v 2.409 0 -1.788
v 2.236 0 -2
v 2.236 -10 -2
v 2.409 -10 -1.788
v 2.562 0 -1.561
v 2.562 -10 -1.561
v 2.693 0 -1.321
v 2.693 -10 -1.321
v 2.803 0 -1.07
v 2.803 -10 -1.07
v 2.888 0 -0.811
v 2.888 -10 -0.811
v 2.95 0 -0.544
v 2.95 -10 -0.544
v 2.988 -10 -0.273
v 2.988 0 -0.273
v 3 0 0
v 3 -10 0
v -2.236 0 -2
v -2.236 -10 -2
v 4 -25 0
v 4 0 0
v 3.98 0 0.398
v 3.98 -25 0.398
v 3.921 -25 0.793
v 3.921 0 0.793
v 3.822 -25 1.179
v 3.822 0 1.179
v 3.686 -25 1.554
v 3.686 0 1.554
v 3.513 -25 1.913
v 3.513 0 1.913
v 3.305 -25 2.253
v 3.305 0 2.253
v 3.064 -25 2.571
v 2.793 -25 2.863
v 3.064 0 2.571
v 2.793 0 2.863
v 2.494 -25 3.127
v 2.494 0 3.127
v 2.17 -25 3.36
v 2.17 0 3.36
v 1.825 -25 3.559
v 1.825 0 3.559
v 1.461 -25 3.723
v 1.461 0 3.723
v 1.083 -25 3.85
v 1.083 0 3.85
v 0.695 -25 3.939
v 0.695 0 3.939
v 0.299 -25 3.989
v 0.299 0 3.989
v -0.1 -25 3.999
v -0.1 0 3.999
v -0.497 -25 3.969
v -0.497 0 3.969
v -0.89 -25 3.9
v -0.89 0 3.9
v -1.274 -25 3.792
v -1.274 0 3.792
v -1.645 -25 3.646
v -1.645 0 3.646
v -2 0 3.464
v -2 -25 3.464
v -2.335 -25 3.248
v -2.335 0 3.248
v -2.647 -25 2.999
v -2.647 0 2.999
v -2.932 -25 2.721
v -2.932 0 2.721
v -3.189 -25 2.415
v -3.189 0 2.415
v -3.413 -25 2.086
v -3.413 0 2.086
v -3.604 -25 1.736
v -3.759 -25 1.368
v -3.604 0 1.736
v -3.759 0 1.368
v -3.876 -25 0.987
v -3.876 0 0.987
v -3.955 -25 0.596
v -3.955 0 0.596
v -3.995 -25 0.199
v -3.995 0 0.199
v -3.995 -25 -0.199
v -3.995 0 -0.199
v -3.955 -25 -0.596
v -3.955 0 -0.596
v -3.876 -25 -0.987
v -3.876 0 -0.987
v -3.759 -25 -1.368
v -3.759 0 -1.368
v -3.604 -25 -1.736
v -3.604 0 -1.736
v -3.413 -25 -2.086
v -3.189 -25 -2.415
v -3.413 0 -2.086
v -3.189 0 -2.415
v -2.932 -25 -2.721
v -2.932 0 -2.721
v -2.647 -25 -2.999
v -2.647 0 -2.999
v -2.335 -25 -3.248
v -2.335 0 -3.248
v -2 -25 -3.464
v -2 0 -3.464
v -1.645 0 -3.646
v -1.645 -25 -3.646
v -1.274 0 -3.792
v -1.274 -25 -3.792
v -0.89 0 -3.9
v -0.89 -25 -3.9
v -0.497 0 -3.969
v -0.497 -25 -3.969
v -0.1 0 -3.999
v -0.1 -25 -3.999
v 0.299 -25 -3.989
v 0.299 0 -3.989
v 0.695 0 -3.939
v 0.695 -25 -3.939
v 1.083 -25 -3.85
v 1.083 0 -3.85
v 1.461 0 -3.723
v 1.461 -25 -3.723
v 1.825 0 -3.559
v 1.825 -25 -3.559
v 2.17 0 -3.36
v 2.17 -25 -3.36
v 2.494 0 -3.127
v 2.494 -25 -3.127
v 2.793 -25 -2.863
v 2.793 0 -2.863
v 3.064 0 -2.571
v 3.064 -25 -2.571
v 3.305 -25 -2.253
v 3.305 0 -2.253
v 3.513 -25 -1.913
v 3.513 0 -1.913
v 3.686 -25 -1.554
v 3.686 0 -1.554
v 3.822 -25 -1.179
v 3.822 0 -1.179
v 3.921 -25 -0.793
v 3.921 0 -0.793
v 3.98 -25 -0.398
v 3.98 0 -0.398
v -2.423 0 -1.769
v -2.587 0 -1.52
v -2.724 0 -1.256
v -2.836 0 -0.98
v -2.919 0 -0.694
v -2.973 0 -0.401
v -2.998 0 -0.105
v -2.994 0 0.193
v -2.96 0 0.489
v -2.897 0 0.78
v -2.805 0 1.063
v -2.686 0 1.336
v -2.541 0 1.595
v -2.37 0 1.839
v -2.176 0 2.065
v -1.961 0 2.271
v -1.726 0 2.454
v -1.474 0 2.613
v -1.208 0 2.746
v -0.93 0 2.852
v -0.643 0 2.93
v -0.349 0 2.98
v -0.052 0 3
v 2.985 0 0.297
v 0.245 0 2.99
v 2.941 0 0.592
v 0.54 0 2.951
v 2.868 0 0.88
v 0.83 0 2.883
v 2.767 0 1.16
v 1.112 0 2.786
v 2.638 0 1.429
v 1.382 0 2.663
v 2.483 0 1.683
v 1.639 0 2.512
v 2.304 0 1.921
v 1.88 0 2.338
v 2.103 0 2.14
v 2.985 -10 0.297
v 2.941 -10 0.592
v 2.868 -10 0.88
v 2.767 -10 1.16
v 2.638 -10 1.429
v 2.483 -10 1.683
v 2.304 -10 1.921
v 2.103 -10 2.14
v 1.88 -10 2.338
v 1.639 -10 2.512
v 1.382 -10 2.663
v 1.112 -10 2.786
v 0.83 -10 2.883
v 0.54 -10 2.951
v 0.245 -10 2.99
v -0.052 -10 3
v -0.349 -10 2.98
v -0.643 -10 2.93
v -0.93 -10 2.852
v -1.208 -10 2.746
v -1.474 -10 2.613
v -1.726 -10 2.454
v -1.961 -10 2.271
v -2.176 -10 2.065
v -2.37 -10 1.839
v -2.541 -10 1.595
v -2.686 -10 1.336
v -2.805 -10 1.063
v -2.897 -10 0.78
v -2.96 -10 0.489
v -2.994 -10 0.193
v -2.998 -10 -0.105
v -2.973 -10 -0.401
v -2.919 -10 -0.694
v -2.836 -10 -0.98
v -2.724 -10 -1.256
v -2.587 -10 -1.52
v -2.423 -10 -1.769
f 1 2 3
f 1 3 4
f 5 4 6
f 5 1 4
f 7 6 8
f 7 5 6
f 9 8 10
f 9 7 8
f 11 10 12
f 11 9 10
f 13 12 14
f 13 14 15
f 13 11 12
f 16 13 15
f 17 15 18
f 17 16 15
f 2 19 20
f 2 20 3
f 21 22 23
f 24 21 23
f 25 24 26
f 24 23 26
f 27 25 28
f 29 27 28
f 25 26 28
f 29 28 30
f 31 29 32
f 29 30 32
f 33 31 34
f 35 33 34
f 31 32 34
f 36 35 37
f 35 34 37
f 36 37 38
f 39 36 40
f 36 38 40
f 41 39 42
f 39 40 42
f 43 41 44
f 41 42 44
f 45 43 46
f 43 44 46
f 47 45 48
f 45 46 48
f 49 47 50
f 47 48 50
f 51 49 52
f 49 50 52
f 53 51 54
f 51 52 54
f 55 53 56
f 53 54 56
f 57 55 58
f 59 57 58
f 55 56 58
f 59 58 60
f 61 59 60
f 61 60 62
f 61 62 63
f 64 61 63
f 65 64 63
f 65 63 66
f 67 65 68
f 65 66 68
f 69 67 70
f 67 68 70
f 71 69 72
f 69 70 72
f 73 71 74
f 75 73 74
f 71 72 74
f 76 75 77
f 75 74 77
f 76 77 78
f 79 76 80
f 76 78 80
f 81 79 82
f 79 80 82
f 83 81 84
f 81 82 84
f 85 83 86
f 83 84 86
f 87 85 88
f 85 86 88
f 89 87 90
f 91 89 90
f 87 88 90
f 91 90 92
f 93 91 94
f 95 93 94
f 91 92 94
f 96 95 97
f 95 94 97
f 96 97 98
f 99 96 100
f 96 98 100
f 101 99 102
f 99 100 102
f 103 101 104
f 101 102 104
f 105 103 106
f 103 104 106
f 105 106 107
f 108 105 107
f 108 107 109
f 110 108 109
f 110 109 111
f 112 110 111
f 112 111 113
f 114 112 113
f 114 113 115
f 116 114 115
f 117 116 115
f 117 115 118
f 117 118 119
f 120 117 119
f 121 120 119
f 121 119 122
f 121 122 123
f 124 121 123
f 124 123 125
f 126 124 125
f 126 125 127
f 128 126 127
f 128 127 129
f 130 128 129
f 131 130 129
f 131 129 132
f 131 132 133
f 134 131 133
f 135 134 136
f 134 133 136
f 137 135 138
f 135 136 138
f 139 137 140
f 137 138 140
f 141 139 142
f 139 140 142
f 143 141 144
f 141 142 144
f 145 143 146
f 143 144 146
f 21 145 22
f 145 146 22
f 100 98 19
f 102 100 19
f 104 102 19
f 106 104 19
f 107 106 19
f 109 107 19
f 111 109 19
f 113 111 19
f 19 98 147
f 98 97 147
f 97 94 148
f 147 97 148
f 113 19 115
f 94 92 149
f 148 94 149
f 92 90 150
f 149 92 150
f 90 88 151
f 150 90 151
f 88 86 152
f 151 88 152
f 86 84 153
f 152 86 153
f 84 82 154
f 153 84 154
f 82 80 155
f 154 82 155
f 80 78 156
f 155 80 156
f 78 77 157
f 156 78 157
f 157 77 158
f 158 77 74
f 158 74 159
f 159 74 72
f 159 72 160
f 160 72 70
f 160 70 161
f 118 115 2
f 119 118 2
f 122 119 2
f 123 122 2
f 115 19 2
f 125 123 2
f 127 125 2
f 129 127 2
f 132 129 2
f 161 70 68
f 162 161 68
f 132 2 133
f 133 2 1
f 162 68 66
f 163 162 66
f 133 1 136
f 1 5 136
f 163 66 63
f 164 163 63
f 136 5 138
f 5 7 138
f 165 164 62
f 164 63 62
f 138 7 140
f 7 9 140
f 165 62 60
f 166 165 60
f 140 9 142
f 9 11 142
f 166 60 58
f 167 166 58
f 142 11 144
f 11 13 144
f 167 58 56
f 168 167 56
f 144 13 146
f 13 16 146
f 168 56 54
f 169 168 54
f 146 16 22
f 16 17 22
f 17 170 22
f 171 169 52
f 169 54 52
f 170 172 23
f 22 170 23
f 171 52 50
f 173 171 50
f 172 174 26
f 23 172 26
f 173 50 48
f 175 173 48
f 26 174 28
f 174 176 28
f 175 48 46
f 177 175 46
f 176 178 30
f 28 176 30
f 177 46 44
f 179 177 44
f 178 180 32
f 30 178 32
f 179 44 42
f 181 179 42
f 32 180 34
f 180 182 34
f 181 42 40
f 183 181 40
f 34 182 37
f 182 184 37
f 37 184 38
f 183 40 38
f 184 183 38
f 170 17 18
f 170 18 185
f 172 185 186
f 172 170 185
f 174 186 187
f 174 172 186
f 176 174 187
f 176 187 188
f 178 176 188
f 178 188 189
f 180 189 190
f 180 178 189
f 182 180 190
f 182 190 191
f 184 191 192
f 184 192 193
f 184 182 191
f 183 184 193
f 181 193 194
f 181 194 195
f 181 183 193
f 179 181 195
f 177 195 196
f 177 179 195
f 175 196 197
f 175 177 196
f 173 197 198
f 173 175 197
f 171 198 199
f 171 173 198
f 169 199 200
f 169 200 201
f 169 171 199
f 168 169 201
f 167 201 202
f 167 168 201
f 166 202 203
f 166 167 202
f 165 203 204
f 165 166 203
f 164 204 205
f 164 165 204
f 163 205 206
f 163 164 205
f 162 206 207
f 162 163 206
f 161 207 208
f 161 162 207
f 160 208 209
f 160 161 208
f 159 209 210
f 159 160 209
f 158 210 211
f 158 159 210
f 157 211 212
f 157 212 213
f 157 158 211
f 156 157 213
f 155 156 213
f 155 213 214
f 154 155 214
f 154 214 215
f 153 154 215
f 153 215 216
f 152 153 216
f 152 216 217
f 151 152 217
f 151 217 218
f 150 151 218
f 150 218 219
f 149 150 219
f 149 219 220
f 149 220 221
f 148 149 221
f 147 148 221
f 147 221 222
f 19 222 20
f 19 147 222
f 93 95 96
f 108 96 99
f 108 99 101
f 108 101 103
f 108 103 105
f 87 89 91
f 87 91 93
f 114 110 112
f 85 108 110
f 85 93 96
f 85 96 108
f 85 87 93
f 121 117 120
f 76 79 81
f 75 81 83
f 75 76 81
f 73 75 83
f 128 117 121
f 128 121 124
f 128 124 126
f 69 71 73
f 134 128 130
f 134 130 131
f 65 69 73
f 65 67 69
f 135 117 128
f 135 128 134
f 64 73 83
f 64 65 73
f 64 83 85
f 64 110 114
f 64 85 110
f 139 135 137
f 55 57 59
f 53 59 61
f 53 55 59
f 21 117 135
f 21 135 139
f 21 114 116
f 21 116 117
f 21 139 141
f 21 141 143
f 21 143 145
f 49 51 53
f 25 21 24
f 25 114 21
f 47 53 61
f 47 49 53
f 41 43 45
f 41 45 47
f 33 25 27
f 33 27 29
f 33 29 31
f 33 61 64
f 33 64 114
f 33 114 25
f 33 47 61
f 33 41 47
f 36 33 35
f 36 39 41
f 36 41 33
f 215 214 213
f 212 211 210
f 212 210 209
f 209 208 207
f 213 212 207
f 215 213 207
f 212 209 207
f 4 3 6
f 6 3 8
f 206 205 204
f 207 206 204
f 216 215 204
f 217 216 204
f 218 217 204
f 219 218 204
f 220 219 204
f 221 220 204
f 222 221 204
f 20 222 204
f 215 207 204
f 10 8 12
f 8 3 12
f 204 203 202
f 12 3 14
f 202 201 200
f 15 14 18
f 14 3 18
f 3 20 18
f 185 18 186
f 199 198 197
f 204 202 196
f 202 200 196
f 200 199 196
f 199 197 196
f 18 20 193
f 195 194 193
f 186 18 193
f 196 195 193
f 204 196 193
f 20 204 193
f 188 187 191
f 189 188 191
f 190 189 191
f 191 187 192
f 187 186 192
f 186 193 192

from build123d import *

# Parameters (mm, degrees)
F0_R     = 4
F1_DEPTH = 25
F2_DEPTH = 10


with BuildPart() as f1:
    # F0 (on Front) → F1 (new body)
    with BuildSketch(Plane.XZ):
        Circle(F0_R)
        with BuildLine():
            ThreePointArc((-2.2360679775, -2), (-1.0704662693, 2.8025170769), (3, 0))
            ThreePointArc((3, 0), (2.8025170769, -1.0704662693), (2.2360679775, -2))
            ThreePointArc((2.2360679775, -2), (1.2247448714, -2.7386127875), (0, -3))
            ThreePointArc((0, -3), (-1.2247448714, -2.7386127875), (-2.2360679775, -2))
        make_face(mode=Mode.SUBTRACT)
        with BuildLine():
            ThreePointArc((2.2360679775, -2), (2.8025170769, -1.0704662693), (3, 0))
            ThreePointArc((3, 0), (-1.0704662693, 2.8025170769), (-2.2360679775, -2))
            Line((-2.2360679775, -2), (0, -2))
            Line((0, -2), (2.2360679775, -2))
        make_face()
        with BuildLine():
            ThreePointArc((0, -3), (1.2247448714, -2.7386127875), (2.2360679775, -2))
            Line((2.2360679775, -2), (0, -2))
            Line((0, -2), (0, -3))
        make_face()
        with BuildLine():
            Line((0, -2), (-2.2360679775, -2))
            ThreePointArc((-2.2360679775, -2), (-1.2247448714, -2.7386127875), (0, -3))
            Line((0, -3), (0, -2))
        make_face()
    extrude(amount=F1_DEPTH)

    # F0 (on Front) → F2 (cut)
    with BuildSketch(Plane.XZ):
        with BuildLine():
            ThreePointArc((2.2360679775, -2), (2.8025170769, -1.0704662693), (3, 0))
            ThreePointArc((3, 0), (-1.0704662693, 2.8025170769), (-2.2360679775, -2))
            Line((-2.2360679775, -2), (0, -2))
            Line((0, -2), (2.2360679775, -2))
        make_face()
    extrude(amount=F2_DEPTH, mode=Mode.SUBTRACT)


solid = f1.part
